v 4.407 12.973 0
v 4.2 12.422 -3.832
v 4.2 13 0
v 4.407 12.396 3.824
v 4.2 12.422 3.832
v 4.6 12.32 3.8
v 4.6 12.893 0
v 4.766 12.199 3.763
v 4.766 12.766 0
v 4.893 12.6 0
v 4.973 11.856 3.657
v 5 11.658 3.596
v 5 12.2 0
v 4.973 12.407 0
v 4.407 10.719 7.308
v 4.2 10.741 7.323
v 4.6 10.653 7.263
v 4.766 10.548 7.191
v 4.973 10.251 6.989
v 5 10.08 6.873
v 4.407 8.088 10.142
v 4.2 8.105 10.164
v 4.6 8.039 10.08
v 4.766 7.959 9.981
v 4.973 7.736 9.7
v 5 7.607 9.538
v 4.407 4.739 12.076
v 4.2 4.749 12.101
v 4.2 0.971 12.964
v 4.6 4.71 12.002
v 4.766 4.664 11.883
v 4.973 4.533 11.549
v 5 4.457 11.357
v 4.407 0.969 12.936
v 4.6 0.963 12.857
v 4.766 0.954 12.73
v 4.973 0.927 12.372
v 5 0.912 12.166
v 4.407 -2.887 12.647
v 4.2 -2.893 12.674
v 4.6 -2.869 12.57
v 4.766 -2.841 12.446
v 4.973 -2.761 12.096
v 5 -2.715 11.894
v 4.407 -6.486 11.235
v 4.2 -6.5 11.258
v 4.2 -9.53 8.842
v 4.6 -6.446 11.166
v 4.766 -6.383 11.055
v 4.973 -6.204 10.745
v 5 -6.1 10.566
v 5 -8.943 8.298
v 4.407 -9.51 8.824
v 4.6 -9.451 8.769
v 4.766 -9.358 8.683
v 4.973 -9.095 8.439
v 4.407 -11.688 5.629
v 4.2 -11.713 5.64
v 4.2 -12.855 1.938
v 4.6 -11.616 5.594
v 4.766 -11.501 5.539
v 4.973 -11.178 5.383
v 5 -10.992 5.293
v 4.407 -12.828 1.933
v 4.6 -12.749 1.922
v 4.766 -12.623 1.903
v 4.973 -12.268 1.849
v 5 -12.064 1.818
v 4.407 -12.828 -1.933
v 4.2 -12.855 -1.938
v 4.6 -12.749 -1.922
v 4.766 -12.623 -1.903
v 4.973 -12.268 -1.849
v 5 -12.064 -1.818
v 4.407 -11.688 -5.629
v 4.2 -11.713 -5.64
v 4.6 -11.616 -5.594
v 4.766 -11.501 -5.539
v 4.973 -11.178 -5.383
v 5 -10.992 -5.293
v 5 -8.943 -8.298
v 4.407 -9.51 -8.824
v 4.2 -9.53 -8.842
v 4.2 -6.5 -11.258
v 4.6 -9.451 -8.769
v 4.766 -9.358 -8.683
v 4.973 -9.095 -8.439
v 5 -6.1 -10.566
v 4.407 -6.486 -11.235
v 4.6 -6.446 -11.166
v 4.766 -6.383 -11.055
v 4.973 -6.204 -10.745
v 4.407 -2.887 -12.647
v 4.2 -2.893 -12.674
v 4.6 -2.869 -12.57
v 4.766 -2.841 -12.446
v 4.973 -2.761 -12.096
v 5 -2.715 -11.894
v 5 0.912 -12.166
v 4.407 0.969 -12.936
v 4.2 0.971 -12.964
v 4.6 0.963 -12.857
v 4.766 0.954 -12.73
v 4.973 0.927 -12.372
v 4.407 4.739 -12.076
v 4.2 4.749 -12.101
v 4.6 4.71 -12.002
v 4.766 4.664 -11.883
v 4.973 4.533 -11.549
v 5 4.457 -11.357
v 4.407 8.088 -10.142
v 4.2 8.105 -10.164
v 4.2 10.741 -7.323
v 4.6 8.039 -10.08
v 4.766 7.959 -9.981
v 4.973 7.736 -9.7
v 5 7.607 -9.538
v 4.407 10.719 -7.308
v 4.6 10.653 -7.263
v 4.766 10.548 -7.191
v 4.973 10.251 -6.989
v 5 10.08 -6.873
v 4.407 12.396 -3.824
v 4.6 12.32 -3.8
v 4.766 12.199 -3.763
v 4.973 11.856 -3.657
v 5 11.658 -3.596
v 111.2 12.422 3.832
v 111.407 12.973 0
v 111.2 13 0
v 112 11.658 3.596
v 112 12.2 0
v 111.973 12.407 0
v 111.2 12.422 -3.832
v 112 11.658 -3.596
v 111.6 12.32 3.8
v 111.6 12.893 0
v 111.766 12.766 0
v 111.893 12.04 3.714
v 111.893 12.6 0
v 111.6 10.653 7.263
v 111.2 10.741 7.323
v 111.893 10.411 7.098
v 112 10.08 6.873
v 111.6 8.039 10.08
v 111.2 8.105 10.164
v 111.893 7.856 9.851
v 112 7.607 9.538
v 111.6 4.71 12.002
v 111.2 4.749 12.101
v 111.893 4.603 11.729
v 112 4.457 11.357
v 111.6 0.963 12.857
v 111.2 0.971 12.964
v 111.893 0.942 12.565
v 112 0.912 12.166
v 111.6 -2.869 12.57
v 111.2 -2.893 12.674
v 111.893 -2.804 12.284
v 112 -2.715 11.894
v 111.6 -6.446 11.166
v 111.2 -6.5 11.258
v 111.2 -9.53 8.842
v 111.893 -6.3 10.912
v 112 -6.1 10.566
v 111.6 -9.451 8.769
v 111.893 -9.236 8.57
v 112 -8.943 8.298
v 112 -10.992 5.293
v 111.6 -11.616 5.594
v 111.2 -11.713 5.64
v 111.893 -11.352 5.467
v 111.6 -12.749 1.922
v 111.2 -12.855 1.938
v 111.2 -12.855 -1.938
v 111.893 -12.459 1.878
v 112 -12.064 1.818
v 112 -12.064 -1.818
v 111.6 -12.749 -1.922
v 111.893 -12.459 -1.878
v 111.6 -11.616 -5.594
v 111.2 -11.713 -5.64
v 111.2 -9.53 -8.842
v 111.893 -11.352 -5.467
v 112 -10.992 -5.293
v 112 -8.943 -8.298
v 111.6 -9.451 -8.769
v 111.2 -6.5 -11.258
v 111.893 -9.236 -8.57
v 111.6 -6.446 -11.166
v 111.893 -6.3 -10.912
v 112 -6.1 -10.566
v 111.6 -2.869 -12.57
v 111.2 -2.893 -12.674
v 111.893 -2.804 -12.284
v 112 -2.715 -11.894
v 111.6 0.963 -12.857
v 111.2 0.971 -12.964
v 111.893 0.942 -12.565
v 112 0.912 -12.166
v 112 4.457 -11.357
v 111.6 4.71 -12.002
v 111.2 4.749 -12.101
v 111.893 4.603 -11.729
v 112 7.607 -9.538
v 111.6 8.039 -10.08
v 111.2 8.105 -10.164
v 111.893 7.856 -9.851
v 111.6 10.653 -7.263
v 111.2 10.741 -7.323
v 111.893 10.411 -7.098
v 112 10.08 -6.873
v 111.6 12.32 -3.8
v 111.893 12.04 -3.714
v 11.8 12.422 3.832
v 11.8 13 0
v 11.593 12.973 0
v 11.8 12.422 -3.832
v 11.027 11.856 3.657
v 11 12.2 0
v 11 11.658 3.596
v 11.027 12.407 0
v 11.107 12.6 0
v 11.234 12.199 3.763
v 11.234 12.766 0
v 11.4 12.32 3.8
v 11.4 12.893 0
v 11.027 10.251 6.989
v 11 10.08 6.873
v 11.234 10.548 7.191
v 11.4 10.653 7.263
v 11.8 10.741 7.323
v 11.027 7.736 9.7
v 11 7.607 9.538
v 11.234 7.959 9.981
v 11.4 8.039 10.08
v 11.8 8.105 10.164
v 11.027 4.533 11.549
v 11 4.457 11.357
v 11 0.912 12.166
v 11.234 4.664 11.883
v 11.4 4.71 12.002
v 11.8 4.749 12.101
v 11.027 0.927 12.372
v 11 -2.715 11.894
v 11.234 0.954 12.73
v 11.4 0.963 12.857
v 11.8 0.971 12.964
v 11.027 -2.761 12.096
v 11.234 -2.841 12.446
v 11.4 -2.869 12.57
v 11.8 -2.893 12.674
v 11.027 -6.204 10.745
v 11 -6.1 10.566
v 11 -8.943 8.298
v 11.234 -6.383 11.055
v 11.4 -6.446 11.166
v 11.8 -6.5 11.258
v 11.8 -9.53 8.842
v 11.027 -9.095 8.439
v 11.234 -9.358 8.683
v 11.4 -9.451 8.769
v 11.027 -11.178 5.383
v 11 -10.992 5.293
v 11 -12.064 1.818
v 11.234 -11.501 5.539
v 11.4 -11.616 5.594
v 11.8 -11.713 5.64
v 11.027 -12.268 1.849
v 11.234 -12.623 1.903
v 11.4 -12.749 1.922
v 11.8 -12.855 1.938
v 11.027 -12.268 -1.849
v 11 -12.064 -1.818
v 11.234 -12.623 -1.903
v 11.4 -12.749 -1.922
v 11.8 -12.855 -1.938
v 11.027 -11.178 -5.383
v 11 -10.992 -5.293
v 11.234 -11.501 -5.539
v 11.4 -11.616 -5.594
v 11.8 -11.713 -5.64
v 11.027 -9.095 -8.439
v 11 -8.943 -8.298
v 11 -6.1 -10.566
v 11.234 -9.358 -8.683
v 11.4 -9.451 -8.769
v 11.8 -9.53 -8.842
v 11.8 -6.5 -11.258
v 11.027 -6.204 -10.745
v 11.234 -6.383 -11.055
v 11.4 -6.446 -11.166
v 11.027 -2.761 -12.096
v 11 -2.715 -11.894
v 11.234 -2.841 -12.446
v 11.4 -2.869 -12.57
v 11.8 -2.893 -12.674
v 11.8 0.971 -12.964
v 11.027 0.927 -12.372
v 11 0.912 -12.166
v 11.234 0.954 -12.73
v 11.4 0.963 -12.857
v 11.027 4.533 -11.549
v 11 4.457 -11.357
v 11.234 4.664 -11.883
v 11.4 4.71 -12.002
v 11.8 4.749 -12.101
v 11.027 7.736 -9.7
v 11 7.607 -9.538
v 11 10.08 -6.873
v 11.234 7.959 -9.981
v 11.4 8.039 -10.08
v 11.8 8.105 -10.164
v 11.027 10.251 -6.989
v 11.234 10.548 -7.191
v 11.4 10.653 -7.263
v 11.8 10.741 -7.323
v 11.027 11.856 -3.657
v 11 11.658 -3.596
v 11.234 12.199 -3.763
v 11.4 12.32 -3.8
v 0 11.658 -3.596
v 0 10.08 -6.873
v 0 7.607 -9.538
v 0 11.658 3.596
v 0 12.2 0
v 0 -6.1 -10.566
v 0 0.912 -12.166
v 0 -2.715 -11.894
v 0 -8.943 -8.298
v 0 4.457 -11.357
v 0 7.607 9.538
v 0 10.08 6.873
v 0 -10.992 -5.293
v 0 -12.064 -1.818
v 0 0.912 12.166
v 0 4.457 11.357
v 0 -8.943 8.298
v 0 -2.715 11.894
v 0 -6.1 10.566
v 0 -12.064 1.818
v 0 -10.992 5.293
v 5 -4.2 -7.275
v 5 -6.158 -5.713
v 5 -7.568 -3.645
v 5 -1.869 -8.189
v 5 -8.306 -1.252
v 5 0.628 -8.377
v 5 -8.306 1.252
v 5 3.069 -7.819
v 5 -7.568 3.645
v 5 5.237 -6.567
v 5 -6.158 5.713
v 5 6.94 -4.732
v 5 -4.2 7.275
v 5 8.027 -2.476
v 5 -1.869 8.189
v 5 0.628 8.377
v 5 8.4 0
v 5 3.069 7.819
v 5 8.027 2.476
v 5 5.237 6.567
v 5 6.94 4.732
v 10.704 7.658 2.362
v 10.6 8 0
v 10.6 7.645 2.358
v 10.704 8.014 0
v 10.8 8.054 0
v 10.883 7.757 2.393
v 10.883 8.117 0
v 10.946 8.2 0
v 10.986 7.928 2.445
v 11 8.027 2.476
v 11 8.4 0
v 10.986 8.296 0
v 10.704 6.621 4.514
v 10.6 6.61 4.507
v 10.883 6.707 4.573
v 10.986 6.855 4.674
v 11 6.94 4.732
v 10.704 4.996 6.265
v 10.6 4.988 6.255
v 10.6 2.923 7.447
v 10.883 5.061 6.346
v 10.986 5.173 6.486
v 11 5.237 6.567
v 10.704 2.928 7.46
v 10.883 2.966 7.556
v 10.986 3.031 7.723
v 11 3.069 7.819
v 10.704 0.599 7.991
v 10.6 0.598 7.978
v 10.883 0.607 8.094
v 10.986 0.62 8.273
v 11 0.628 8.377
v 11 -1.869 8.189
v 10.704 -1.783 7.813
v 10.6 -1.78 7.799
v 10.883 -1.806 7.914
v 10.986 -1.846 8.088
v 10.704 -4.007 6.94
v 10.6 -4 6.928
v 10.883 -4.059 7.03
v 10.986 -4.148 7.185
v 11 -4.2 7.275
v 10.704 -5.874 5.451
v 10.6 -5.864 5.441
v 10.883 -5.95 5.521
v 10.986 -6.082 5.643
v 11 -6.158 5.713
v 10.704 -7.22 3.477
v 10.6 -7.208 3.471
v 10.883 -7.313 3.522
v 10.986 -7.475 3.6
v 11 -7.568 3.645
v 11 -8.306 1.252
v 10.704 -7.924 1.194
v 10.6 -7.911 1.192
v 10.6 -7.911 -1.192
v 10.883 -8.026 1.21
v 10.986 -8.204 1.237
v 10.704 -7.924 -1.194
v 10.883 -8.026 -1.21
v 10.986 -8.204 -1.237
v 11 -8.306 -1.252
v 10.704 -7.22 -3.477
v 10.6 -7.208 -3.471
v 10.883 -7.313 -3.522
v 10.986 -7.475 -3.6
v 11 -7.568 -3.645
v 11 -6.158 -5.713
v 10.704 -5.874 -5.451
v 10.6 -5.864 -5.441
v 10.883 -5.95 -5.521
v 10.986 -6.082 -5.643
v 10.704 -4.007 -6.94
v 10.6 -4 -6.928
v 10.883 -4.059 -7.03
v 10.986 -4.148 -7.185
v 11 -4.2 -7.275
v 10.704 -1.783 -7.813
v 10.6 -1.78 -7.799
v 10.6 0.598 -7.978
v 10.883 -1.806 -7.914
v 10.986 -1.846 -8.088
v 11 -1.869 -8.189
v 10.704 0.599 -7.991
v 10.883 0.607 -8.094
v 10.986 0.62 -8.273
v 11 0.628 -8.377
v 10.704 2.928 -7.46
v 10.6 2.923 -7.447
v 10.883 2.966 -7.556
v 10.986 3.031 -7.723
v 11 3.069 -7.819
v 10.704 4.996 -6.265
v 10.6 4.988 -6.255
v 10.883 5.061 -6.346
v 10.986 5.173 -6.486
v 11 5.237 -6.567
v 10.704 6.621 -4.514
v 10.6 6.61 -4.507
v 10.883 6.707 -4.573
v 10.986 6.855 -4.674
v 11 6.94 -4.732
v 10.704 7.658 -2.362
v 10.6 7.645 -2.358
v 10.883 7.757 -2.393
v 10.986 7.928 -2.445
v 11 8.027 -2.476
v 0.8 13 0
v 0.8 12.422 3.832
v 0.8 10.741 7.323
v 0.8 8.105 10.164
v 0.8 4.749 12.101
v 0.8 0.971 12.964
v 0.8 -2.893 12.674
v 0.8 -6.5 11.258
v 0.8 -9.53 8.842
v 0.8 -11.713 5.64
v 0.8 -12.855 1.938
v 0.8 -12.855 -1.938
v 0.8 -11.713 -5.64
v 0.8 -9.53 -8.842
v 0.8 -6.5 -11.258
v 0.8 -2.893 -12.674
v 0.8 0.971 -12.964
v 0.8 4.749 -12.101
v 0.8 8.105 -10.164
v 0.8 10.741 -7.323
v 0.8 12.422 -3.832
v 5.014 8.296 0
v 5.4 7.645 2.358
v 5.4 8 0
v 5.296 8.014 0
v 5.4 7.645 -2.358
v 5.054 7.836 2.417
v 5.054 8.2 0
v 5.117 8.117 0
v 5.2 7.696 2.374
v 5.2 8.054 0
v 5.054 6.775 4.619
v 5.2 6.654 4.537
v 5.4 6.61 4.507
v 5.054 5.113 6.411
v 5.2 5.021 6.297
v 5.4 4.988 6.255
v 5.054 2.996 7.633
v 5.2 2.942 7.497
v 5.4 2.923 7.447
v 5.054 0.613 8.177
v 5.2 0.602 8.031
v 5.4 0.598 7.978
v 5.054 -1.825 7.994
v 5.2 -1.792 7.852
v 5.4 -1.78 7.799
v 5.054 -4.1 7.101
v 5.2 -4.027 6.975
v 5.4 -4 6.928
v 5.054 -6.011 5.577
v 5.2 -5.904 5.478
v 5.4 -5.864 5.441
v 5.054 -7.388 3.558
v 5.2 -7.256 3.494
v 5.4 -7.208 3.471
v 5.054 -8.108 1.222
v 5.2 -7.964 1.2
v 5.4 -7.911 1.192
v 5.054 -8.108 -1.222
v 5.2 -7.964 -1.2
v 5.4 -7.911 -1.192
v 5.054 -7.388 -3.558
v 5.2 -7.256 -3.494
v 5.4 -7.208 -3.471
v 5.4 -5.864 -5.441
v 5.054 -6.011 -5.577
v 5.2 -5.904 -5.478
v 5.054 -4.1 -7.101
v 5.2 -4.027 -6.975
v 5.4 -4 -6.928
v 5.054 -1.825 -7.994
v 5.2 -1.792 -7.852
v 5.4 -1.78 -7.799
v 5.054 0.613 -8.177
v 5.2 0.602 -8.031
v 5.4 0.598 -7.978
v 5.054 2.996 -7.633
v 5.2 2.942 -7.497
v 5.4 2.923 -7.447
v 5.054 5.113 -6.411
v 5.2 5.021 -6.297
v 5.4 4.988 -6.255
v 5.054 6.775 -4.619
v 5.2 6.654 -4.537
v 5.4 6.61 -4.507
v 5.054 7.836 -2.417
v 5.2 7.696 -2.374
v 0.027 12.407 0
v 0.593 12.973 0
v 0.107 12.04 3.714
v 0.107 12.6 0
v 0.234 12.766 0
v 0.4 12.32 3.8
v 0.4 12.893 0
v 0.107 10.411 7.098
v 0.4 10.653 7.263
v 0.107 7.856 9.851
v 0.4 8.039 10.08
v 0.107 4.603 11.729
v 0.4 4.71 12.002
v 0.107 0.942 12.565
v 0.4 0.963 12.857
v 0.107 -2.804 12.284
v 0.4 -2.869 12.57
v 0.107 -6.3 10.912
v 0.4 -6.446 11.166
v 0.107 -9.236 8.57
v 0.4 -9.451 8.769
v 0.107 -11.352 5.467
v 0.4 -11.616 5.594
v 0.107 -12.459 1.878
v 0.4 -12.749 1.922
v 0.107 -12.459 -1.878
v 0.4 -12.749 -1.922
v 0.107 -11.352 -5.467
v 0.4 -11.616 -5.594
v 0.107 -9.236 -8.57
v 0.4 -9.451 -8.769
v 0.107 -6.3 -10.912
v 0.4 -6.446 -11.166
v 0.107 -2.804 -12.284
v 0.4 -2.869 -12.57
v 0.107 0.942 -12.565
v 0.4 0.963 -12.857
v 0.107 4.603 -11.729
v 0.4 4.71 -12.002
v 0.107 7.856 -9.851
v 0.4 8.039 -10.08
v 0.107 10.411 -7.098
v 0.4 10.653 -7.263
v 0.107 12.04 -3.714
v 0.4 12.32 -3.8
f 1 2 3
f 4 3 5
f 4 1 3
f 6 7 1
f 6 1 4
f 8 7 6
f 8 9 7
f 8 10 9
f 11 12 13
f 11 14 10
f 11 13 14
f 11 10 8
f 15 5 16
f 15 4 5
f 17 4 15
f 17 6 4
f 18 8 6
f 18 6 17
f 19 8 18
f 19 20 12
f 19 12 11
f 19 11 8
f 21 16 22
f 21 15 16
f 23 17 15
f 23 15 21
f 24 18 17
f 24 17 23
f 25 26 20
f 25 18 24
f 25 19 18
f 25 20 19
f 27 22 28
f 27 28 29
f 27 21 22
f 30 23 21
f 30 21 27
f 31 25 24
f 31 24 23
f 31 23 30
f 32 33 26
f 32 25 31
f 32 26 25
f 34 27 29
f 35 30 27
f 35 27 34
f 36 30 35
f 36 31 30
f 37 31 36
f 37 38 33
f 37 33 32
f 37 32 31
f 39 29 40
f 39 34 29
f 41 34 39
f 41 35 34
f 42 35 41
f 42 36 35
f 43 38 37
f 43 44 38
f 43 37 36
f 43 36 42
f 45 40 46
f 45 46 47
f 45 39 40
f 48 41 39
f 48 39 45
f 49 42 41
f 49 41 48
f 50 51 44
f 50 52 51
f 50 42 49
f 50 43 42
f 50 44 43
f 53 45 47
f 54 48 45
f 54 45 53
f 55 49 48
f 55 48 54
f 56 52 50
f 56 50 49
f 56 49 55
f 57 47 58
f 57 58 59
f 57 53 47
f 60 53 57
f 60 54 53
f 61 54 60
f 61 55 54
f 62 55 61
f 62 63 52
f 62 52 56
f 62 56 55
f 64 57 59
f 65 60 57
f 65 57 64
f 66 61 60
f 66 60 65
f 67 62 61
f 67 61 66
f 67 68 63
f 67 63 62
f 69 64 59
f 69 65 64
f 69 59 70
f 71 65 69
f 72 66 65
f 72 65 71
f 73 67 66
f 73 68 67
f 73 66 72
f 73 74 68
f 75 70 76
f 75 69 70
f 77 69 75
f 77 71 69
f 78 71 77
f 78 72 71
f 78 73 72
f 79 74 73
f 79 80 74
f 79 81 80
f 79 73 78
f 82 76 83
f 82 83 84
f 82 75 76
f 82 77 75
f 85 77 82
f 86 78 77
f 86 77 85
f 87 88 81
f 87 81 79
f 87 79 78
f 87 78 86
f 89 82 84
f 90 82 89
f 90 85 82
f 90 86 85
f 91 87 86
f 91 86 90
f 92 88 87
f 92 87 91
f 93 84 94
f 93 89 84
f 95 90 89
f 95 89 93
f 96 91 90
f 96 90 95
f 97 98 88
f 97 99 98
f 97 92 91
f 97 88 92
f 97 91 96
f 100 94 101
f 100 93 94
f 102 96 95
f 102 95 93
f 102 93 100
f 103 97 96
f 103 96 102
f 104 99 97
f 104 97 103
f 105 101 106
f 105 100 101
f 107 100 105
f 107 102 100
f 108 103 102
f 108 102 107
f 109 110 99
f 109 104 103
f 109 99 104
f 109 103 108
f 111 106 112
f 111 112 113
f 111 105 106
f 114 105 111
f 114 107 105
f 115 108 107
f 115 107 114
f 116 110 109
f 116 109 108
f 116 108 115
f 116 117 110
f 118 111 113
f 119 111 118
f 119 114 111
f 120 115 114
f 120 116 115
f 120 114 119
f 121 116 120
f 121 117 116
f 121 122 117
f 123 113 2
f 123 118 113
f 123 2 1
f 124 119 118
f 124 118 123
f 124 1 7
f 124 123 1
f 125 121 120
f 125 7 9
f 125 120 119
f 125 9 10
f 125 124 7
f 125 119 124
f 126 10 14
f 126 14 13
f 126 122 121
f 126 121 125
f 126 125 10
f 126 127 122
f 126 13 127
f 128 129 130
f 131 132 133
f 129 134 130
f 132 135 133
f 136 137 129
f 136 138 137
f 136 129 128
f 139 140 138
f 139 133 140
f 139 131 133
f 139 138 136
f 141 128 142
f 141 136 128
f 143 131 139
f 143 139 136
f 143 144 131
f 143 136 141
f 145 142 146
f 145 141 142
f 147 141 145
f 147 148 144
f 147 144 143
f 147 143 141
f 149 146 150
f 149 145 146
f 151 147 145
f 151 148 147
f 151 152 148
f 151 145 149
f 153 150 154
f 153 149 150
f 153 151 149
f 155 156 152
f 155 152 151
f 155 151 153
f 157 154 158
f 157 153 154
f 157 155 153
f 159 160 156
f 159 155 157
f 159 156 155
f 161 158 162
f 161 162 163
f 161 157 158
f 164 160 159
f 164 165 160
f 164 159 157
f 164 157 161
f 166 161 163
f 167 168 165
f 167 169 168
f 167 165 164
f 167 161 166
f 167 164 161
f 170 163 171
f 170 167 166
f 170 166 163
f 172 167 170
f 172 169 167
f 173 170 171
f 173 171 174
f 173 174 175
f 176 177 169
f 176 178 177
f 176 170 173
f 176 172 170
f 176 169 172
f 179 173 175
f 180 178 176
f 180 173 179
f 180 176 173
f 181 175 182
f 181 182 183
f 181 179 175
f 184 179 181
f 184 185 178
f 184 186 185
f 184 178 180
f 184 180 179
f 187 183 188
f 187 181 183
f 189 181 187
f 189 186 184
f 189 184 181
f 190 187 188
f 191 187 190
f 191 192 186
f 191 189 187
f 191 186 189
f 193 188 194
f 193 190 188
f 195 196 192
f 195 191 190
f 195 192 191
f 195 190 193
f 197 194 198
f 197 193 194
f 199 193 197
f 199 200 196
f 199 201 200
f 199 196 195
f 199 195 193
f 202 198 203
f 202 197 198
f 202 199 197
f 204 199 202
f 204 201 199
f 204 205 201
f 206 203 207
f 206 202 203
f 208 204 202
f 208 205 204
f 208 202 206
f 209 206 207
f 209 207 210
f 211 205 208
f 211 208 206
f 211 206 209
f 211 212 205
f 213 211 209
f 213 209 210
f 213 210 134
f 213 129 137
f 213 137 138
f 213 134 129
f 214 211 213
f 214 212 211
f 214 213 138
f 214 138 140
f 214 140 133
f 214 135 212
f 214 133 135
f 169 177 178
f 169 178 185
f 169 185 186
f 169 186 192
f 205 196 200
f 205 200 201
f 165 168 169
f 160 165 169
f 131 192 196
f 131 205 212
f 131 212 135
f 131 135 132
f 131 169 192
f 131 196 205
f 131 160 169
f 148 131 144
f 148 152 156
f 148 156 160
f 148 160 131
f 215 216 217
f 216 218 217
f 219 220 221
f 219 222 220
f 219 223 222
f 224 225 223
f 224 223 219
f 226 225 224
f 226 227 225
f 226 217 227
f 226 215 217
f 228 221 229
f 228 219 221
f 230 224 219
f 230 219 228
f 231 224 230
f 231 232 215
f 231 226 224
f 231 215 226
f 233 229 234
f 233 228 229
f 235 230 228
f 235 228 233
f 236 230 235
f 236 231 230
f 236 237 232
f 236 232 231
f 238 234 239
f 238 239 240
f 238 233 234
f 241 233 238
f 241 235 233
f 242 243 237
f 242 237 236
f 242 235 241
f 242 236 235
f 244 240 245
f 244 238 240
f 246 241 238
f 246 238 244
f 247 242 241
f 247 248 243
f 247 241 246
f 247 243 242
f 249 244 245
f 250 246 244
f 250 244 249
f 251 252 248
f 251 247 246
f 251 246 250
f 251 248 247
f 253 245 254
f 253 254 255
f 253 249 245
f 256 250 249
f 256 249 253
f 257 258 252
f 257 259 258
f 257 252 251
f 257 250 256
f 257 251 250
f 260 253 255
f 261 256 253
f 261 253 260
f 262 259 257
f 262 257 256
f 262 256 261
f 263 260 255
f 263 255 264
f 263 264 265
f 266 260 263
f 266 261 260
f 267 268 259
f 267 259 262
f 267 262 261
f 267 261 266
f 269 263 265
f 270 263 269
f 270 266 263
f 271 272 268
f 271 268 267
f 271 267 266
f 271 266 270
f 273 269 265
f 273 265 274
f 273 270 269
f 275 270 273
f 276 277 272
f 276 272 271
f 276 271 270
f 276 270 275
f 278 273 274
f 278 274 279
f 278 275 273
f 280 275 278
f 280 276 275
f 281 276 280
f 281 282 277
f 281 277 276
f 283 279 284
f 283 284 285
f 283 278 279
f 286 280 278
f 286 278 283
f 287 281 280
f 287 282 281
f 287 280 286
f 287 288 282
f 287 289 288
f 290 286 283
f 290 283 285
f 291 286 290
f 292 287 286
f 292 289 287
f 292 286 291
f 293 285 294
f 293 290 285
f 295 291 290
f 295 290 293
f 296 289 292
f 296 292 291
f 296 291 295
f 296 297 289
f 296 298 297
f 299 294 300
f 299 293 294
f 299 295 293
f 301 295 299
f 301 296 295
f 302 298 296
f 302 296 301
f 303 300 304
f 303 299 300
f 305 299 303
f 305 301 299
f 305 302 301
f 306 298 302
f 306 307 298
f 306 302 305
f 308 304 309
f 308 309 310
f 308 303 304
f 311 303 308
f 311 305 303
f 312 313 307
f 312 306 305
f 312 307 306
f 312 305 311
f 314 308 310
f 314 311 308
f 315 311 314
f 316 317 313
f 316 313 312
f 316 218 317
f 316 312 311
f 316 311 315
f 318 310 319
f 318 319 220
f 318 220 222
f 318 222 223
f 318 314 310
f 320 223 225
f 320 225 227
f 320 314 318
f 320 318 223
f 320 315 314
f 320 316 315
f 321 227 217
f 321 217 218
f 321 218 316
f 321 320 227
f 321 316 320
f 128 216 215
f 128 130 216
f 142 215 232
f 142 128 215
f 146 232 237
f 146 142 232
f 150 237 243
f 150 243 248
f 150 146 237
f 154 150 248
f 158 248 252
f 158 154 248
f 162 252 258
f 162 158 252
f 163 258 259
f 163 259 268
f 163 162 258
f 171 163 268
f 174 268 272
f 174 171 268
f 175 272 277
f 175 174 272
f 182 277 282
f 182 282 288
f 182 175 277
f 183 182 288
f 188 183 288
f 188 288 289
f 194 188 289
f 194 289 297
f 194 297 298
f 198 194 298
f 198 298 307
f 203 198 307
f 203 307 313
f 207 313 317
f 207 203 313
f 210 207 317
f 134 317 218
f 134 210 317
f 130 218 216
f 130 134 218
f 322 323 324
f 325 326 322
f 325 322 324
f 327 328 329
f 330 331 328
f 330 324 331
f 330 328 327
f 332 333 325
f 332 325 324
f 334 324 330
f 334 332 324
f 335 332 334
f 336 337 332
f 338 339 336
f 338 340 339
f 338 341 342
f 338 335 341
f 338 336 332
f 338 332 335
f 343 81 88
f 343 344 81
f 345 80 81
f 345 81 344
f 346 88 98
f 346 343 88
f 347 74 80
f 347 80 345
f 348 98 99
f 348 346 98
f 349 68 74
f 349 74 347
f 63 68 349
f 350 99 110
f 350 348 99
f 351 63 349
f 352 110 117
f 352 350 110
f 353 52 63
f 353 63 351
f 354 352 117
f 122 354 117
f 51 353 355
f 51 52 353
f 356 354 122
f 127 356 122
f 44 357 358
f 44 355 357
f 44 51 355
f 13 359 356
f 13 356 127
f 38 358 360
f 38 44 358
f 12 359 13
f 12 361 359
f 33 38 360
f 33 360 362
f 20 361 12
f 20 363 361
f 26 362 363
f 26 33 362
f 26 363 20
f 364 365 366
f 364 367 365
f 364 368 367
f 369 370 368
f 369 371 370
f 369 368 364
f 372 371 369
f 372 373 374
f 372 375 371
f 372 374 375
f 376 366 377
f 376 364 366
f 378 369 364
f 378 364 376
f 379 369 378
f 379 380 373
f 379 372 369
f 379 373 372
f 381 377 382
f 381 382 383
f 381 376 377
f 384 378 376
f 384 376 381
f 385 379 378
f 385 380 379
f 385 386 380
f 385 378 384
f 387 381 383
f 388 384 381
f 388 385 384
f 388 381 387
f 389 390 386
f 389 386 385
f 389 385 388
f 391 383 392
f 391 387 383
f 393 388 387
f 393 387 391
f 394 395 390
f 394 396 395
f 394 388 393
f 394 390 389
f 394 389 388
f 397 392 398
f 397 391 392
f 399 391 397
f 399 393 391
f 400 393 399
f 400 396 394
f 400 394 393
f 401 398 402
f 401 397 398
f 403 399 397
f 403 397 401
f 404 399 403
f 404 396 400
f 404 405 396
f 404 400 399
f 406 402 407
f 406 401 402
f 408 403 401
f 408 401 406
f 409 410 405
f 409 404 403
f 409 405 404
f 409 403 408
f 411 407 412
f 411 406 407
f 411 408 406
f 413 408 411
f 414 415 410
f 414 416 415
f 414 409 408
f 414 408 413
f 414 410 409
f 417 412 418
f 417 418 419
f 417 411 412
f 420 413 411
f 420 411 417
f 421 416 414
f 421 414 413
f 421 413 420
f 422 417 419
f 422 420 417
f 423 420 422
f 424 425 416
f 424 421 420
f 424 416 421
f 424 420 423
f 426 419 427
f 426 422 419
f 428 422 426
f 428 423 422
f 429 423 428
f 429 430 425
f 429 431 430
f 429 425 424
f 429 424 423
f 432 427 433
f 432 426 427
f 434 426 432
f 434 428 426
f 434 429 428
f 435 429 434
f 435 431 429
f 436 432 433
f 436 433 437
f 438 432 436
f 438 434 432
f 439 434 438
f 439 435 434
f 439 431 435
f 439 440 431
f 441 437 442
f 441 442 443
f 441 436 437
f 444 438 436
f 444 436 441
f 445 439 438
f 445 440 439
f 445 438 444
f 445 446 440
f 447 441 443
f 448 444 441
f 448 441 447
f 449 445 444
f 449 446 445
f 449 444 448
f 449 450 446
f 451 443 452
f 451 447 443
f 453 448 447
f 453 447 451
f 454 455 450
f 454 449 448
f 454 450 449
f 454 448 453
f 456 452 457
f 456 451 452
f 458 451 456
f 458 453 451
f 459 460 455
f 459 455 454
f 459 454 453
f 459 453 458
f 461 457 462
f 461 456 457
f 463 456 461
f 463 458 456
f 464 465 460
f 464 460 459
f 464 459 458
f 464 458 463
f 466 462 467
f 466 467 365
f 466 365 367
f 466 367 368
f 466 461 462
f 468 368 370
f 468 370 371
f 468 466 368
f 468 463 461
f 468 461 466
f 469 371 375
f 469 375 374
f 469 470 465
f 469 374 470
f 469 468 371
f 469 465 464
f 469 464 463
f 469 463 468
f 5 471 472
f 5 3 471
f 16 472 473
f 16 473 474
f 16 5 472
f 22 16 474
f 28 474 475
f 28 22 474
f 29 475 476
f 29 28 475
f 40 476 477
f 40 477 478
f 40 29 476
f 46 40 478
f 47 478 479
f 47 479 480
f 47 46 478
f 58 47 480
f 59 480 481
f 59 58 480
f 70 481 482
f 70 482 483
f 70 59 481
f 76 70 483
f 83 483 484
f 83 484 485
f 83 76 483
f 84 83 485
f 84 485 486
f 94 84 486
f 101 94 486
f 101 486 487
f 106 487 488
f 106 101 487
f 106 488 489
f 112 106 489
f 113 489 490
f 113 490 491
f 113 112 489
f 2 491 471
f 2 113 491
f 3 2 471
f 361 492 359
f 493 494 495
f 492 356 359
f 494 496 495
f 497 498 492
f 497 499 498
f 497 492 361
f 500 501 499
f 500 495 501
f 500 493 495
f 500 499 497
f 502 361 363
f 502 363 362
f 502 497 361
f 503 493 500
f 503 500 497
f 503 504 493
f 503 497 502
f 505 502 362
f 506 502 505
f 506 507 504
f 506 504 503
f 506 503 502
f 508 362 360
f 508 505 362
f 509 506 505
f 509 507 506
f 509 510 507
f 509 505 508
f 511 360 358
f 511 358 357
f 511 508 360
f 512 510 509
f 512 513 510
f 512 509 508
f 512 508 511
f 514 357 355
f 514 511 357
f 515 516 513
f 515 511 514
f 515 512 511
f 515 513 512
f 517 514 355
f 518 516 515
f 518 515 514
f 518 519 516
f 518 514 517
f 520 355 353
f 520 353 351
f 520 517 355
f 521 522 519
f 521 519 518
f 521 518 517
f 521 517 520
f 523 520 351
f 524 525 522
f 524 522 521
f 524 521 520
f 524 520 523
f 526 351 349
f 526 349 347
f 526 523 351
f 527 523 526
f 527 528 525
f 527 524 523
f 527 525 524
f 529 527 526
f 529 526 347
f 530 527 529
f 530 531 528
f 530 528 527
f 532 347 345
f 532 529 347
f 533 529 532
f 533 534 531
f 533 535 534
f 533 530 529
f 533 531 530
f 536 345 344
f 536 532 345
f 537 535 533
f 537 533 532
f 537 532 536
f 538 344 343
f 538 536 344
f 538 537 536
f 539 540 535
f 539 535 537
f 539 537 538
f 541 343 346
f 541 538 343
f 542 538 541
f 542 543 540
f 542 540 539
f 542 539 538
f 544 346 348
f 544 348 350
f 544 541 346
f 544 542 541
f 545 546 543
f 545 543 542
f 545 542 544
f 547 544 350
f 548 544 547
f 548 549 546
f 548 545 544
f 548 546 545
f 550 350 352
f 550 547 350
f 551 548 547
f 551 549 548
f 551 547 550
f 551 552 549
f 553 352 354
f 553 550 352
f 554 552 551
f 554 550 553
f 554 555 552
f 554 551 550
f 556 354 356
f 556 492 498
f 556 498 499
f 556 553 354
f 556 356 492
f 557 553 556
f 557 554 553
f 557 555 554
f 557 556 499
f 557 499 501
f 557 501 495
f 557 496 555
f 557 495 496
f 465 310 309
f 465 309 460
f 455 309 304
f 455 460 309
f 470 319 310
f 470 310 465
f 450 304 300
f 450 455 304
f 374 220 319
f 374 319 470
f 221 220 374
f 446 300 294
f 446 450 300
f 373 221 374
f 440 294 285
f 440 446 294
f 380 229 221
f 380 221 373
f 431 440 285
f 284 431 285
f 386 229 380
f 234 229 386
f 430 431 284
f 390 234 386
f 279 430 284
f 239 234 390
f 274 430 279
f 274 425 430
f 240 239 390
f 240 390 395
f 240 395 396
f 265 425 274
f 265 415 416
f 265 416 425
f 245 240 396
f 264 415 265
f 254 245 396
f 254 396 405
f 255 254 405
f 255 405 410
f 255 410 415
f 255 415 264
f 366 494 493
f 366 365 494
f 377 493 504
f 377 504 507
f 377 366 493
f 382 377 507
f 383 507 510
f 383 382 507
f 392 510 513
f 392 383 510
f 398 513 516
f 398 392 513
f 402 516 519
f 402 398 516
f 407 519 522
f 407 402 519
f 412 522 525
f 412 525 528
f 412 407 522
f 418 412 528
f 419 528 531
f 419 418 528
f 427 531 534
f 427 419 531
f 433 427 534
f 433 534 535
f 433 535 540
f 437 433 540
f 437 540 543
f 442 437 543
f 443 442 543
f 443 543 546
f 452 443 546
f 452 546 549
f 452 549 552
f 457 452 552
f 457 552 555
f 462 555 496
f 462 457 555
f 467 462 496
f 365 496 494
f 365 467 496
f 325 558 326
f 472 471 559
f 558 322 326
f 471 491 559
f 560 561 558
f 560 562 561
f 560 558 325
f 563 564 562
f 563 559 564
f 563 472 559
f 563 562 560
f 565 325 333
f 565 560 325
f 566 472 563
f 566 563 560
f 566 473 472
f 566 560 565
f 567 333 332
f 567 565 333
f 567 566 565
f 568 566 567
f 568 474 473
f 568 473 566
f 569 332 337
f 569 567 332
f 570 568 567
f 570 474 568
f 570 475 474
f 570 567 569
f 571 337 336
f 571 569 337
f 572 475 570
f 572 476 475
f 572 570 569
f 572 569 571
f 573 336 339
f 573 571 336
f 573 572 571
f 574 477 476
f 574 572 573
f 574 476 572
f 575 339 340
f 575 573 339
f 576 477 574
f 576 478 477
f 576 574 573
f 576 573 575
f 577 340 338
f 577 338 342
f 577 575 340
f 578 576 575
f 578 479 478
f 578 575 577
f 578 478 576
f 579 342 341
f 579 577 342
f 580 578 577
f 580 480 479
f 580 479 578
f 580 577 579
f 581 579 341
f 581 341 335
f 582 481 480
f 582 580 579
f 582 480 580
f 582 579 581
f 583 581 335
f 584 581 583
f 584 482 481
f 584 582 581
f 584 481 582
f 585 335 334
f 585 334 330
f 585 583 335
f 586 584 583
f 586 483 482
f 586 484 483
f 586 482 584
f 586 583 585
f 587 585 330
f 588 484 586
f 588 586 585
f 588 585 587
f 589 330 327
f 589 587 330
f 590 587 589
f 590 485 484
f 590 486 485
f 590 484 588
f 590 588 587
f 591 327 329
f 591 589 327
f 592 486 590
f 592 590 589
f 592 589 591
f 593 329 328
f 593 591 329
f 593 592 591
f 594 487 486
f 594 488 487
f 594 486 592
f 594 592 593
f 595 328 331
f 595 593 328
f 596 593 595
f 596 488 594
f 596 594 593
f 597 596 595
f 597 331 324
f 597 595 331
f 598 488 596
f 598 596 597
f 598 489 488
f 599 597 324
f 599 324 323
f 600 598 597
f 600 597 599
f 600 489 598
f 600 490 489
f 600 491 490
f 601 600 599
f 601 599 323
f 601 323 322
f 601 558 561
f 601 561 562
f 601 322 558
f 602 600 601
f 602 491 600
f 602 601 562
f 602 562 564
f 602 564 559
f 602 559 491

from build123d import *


with BuildPart() as part:
    # Sketch1 → Base-Revolve (revolve)
    with BuildSketch(Plane.XY):
        with BuildLine():
            Line((0, 0), (0, 12.2))
            ThreePointArc((0, 12.2), (0.234314575, 12.765685425), (0.8, 13))
            Line((0.8, 13), (4.2, 13))
            ThreePointArc((4.2, 13), (4.765685425, 12.765685425), (5, 12.2))
            Line((5, 12.2), (5, 8.4))
            ThreePointArc((5, 8.4), (5.117157288, 8.117157288), (5.4, 8))
            Line((5.4, 8), (10.6, 8))
            ThreePointArc((10.6, 8), (10.882842712, 8.117157288), (11, 8.4))
            Line((11, 8.4), (11, 12.2))
            ThreePointArc((11, 12.2), (11.234314575, 12.765685425), (11.8, 13))
            Line((11.8, 13), (111.2, 13))
            ThreePointArc((111.2, 13), (111.765685425, 12.765685425), (112, 12.2))
            Line((112, 12.2), (112, 0))
            Line((112, 0), (0, 0))
        make_face()
    revolve(axis=Axis((0, 0, 0), (1, 0, 0)))


solid = part.part
